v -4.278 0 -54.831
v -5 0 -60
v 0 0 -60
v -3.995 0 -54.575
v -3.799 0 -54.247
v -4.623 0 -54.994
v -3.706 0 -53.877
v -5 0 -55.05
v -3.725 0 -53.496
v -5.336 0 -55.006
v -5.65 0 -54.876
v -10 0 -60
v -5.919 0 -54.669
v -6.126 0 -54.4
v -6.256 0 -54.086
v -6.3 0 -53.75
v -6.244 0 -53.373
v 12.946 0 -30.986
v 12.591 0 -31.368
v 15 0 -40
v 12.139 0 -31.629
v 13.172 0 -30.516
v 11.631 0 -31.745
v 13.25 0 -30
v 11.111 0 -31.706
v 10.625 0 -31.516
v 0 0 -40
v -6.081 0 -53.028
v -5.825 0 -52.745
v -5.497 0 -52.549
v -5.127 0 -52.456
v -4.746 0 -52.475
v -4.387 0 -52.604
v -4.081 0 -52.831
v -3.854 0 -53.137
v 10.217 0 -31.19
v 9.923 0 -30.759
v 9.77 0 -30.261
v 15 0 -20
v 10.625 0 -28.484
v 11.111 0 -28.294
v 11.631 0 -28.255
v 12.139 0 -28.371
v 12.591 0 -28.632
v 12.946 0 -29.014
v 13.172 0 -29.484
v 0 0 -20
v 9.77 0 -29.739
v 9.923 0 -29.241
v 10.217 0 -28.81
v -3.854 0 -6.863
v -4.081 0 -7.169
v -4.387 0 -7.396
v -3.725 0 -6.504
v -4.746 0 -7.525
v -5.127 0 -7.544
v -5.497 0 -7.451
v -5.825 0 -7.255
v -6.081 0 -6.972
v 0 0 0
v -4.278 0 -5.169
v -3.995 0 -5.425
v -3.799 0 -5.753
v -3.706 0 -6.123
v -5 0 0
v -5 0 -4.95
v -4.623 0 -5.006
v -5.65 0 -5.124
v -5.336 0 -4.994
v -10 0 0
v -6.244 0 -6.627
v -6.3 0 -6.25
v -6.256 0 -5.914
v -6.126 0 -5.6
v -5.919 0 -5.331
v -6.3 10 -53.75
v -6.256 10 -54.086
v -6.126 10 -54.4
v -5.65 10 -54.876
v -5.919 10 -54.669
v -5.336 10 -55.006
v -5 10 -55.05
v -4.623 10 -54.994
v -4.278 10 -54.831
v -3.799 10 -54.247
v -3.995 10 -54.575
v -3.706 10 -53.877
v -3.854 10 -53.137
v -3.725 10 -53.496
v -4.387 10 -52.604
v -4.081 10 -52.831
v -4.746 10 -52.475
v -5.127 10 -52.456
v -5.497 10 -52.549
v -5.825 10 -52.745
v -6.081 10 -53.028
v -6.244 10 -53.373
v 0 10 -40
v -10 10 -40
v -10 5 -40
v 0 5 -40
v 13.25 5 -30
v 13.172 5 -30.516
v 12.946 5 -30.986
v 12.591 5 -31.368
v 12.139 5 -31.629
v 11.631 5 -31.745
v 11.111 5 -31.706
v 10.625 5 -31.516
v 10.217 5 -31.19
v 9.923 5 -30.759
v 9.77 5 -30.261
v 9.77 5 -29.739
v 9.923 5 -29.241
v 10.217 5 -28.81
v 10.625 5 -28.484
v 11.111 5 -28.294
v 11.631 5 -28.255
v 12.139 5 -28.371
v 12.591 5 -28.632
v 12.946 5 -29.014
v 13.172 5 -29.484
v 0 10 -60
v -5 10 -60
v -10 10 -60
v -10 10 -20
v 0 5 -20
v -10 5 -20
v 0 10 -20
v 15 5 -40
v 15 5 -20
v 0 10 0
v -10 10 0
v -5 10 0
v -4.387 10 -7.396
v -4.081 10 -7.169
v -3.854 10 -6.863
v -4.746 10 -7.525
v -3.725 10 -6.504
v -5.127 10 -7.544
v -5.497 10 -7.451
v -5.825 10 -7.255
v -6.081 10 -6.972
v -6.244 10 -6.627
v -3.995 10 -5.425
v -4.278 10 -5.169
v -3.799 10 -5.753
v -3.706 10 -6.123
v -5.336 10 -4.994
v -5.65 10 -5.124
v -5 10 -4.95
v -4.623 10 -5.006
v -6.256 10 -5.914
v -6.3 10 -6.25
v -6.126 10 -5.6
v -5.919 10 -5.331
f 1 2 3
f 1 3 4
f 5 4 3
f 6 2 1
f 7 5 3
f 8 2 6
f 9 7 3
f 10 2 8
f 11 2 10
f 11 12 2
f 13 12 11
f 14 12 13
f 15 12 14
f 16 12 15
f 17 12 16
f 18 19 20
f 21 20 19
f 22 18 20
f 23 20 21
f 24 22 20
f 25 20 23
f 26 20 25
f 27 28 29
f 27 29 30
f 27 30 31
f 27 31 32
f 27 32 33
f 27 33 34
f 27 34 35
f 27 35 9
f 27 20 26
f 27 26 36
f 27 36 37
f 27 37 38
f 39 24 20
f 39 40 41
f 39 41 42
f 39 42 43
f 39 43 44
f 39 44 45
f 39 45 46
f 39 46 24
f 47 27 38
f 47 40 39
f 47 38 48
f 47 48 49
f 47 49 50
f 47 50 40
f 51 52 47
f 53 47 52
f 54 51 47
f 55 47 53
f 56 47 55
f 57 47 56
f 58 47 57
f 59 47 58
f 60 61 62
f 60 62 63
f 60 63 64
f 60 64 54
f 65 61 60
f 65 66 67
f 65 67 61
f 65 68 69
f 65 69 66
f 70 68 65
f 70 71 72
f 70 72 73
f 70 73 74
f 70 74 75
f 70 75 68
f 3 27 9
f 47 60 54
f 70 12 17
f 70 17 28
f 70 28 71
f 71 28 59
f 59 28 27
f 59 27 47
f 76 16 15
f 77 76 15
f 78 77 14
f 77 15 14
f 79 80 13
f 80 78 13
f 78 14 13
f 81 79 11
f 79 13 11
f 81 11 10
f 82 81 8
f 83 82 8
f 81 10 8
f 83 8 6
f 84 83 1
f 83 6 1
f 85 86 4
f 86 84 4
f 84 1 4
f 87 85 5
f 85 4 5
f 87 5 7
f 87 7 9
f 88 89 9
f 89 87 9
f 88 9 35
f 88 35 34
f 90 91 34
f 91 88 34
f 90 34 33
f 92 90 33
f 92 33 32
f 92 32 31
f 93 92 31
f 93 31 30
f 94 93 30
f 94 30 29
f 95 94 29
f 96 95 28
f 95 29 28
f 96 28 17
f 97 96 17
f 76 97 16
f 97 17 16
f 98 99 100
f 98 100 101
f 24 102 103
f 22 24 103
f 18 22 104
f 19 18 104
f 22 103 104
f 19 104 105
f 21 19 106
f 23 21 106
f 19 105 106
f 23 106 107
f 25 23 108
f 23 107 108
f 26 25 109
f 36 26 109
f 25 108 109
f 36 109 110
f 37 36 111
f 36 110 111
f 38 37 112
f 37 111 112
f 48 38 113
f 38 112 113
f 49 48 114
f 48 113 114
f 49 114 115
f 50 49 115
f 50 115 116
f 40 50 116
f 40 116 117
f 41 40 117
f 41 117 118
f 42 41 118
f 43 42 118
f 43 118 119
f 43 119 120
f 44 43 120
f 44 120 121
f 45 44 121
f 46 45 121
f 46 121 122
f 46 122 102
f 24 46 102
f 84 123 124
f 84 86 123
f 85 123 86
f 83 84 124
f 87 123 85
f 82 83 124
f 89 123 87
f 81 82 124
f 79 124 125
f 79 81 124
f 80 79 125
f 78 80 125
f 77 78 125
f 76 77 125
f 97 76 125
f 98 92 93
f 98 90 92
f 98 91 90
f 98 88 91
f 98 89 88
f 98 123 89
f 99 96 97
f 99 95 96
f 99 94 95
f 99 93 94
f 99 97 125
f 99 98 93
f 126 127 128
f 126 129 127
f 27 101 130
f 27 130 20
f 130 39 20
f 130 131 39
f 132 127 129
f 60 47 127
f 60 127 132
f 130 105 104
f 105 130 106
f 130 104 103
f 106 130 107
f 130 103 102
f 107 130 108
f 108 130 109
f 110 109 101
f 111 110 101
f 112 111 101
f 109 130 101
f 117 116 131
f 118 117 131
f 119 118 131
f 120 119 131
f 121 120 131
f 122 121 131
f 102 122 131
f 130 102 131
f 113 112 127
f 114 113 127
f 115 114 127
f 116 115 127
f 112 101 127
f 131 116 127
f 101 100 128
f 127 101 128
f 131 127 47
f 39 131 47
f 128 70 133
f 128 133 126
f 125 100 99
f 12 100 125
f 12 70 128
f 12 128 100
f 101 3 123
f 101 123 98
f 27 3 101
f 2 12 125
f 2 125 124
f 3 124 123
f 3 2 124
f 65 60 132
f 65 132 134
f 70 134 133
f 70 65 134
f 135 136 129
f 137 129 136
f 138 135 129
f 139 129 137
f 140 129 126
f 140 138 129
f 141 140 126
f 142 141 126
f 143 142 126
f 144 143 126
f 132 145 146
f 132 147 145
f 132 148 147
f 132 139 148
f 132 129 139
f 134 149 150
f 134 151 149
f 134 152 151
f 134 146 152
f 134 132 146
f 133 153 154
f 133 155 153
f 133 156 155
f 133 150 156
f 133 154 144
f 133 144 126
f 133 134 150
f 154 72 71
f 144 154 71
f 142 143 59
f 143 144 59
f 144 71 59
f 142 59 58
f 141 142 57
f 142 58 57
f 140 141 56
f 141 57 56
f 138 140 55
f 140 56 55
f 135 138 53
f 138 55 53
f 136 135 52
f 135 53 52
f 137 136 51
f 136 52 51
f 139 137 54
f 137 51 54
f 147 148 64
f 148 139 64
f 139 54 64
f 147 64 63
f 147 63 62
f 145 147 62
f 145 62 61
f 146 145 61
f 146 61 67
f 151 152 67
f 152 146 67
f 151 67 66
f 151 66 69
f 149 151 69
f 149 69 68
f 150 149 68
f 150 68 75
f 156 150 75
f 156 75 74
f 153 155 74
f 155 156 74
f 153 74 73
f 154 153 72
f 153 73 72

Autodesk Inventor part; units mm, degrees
ref_plane "YZ Plane" through (0, 0, 0) normal (1, 0, 0) x (0, 1, 0)
ref_plane "XZ Plane" through (0, 0, 0) normal (0, 1, 0) x (-1, 0, 0)
ref_plane "XY Plane" through (0, 0, 0) normal (0, 0, 1) x (1, 0, 0)
sketch "Sketch1" plane through (0, 0, 0) normal (0, 1, 0) x (-1, 0, 0)
  line L0 (0, 0) -> (10, 0)
  line L1 (10, 0) -> (10, -60)
  line L2 (10, -60) -> (0, -60)
  line L3 (0, -60) -> (0, 0)
  line L4 (5, 0) -> (5, -6.25)
  circle A0 centre (5, -6.25) radius 1.3
  line L5 (5, -60) -> (5, -53.75)
  circle A1 centre (5, -53.75) radius 1.3
  dimension "d0" = 10
  dimension "d1" = 60
  dimension "d2" = 6.25
  dimension "d3" = 2.6
  dimension "d4" = 6.25
  dimension "d5" = 2.6
extrude "Extrusion1" add sketch "Sketch1" along normal blind 10
sketch "Sketch4" plane through (0, 10, 0) normal (0, 1, 0) x (1, 0, 0)
  line L0 (0, 0) -> (0, 60) projected
  line L1 (0, 0) -> (0, 10)
  line L2 (0, 60) -> (0, 40)
  line L3 (-10, 60) -> (-10, 0) projected
  line L4 (-10, 10) -> (-10, 50)
  line L5 (0, 50) -> (0, 10)
  line L6 (-10, 0) -> (0, 0) projected
  line L7 (0, 0) -> (0, 20)
  line L8 (0, 20) -> (-10, 20)
  line L9 (-10, 60) -> (-10, 40)
  line L10 (-10, 60) -> (10, 60) construction
  line L11 (-10, 40) -> (0, 40)
  dimension "d19" = 20
  dimension "d20" = 20
  dimension "d21" = 90
extrude "Extrusion3" cut sketch "Sketch4" against normal blind 5 contours L8 L3 L11 L0
sketch "Sketch8" plane through (0, 0, 0) normal (1, 0, 0) x (0, 0, -1)
  line L0 (40, 5) -> (20, 5) projected
  line L1 (20, 5) -> (20, 0)
  line L2 (40, 5) -> (40, 0)
  line L3 (60, 0) -> (0, 0) projected
extrude "Extrusion5" add sketch "Sketch8" along normal blind 15
sketch "Sketch9" plane through (0, 5, 0) normal (0, 1, 0) x (1, 0, 0)
  line L0 (15, 40) -> (15, 20) projected
  line L1 (15, 30) -> (11.5, 30)
  circle A0 centre (11.5, 30) radius 1.75
  point P0 (0, 0)
  dimension "d24" = 3.5
  dimension "d25" = 3.5
extrude "Extrusion6" cut sketch "Sketch9" against normal blind 5
properties part number "clawstack"
